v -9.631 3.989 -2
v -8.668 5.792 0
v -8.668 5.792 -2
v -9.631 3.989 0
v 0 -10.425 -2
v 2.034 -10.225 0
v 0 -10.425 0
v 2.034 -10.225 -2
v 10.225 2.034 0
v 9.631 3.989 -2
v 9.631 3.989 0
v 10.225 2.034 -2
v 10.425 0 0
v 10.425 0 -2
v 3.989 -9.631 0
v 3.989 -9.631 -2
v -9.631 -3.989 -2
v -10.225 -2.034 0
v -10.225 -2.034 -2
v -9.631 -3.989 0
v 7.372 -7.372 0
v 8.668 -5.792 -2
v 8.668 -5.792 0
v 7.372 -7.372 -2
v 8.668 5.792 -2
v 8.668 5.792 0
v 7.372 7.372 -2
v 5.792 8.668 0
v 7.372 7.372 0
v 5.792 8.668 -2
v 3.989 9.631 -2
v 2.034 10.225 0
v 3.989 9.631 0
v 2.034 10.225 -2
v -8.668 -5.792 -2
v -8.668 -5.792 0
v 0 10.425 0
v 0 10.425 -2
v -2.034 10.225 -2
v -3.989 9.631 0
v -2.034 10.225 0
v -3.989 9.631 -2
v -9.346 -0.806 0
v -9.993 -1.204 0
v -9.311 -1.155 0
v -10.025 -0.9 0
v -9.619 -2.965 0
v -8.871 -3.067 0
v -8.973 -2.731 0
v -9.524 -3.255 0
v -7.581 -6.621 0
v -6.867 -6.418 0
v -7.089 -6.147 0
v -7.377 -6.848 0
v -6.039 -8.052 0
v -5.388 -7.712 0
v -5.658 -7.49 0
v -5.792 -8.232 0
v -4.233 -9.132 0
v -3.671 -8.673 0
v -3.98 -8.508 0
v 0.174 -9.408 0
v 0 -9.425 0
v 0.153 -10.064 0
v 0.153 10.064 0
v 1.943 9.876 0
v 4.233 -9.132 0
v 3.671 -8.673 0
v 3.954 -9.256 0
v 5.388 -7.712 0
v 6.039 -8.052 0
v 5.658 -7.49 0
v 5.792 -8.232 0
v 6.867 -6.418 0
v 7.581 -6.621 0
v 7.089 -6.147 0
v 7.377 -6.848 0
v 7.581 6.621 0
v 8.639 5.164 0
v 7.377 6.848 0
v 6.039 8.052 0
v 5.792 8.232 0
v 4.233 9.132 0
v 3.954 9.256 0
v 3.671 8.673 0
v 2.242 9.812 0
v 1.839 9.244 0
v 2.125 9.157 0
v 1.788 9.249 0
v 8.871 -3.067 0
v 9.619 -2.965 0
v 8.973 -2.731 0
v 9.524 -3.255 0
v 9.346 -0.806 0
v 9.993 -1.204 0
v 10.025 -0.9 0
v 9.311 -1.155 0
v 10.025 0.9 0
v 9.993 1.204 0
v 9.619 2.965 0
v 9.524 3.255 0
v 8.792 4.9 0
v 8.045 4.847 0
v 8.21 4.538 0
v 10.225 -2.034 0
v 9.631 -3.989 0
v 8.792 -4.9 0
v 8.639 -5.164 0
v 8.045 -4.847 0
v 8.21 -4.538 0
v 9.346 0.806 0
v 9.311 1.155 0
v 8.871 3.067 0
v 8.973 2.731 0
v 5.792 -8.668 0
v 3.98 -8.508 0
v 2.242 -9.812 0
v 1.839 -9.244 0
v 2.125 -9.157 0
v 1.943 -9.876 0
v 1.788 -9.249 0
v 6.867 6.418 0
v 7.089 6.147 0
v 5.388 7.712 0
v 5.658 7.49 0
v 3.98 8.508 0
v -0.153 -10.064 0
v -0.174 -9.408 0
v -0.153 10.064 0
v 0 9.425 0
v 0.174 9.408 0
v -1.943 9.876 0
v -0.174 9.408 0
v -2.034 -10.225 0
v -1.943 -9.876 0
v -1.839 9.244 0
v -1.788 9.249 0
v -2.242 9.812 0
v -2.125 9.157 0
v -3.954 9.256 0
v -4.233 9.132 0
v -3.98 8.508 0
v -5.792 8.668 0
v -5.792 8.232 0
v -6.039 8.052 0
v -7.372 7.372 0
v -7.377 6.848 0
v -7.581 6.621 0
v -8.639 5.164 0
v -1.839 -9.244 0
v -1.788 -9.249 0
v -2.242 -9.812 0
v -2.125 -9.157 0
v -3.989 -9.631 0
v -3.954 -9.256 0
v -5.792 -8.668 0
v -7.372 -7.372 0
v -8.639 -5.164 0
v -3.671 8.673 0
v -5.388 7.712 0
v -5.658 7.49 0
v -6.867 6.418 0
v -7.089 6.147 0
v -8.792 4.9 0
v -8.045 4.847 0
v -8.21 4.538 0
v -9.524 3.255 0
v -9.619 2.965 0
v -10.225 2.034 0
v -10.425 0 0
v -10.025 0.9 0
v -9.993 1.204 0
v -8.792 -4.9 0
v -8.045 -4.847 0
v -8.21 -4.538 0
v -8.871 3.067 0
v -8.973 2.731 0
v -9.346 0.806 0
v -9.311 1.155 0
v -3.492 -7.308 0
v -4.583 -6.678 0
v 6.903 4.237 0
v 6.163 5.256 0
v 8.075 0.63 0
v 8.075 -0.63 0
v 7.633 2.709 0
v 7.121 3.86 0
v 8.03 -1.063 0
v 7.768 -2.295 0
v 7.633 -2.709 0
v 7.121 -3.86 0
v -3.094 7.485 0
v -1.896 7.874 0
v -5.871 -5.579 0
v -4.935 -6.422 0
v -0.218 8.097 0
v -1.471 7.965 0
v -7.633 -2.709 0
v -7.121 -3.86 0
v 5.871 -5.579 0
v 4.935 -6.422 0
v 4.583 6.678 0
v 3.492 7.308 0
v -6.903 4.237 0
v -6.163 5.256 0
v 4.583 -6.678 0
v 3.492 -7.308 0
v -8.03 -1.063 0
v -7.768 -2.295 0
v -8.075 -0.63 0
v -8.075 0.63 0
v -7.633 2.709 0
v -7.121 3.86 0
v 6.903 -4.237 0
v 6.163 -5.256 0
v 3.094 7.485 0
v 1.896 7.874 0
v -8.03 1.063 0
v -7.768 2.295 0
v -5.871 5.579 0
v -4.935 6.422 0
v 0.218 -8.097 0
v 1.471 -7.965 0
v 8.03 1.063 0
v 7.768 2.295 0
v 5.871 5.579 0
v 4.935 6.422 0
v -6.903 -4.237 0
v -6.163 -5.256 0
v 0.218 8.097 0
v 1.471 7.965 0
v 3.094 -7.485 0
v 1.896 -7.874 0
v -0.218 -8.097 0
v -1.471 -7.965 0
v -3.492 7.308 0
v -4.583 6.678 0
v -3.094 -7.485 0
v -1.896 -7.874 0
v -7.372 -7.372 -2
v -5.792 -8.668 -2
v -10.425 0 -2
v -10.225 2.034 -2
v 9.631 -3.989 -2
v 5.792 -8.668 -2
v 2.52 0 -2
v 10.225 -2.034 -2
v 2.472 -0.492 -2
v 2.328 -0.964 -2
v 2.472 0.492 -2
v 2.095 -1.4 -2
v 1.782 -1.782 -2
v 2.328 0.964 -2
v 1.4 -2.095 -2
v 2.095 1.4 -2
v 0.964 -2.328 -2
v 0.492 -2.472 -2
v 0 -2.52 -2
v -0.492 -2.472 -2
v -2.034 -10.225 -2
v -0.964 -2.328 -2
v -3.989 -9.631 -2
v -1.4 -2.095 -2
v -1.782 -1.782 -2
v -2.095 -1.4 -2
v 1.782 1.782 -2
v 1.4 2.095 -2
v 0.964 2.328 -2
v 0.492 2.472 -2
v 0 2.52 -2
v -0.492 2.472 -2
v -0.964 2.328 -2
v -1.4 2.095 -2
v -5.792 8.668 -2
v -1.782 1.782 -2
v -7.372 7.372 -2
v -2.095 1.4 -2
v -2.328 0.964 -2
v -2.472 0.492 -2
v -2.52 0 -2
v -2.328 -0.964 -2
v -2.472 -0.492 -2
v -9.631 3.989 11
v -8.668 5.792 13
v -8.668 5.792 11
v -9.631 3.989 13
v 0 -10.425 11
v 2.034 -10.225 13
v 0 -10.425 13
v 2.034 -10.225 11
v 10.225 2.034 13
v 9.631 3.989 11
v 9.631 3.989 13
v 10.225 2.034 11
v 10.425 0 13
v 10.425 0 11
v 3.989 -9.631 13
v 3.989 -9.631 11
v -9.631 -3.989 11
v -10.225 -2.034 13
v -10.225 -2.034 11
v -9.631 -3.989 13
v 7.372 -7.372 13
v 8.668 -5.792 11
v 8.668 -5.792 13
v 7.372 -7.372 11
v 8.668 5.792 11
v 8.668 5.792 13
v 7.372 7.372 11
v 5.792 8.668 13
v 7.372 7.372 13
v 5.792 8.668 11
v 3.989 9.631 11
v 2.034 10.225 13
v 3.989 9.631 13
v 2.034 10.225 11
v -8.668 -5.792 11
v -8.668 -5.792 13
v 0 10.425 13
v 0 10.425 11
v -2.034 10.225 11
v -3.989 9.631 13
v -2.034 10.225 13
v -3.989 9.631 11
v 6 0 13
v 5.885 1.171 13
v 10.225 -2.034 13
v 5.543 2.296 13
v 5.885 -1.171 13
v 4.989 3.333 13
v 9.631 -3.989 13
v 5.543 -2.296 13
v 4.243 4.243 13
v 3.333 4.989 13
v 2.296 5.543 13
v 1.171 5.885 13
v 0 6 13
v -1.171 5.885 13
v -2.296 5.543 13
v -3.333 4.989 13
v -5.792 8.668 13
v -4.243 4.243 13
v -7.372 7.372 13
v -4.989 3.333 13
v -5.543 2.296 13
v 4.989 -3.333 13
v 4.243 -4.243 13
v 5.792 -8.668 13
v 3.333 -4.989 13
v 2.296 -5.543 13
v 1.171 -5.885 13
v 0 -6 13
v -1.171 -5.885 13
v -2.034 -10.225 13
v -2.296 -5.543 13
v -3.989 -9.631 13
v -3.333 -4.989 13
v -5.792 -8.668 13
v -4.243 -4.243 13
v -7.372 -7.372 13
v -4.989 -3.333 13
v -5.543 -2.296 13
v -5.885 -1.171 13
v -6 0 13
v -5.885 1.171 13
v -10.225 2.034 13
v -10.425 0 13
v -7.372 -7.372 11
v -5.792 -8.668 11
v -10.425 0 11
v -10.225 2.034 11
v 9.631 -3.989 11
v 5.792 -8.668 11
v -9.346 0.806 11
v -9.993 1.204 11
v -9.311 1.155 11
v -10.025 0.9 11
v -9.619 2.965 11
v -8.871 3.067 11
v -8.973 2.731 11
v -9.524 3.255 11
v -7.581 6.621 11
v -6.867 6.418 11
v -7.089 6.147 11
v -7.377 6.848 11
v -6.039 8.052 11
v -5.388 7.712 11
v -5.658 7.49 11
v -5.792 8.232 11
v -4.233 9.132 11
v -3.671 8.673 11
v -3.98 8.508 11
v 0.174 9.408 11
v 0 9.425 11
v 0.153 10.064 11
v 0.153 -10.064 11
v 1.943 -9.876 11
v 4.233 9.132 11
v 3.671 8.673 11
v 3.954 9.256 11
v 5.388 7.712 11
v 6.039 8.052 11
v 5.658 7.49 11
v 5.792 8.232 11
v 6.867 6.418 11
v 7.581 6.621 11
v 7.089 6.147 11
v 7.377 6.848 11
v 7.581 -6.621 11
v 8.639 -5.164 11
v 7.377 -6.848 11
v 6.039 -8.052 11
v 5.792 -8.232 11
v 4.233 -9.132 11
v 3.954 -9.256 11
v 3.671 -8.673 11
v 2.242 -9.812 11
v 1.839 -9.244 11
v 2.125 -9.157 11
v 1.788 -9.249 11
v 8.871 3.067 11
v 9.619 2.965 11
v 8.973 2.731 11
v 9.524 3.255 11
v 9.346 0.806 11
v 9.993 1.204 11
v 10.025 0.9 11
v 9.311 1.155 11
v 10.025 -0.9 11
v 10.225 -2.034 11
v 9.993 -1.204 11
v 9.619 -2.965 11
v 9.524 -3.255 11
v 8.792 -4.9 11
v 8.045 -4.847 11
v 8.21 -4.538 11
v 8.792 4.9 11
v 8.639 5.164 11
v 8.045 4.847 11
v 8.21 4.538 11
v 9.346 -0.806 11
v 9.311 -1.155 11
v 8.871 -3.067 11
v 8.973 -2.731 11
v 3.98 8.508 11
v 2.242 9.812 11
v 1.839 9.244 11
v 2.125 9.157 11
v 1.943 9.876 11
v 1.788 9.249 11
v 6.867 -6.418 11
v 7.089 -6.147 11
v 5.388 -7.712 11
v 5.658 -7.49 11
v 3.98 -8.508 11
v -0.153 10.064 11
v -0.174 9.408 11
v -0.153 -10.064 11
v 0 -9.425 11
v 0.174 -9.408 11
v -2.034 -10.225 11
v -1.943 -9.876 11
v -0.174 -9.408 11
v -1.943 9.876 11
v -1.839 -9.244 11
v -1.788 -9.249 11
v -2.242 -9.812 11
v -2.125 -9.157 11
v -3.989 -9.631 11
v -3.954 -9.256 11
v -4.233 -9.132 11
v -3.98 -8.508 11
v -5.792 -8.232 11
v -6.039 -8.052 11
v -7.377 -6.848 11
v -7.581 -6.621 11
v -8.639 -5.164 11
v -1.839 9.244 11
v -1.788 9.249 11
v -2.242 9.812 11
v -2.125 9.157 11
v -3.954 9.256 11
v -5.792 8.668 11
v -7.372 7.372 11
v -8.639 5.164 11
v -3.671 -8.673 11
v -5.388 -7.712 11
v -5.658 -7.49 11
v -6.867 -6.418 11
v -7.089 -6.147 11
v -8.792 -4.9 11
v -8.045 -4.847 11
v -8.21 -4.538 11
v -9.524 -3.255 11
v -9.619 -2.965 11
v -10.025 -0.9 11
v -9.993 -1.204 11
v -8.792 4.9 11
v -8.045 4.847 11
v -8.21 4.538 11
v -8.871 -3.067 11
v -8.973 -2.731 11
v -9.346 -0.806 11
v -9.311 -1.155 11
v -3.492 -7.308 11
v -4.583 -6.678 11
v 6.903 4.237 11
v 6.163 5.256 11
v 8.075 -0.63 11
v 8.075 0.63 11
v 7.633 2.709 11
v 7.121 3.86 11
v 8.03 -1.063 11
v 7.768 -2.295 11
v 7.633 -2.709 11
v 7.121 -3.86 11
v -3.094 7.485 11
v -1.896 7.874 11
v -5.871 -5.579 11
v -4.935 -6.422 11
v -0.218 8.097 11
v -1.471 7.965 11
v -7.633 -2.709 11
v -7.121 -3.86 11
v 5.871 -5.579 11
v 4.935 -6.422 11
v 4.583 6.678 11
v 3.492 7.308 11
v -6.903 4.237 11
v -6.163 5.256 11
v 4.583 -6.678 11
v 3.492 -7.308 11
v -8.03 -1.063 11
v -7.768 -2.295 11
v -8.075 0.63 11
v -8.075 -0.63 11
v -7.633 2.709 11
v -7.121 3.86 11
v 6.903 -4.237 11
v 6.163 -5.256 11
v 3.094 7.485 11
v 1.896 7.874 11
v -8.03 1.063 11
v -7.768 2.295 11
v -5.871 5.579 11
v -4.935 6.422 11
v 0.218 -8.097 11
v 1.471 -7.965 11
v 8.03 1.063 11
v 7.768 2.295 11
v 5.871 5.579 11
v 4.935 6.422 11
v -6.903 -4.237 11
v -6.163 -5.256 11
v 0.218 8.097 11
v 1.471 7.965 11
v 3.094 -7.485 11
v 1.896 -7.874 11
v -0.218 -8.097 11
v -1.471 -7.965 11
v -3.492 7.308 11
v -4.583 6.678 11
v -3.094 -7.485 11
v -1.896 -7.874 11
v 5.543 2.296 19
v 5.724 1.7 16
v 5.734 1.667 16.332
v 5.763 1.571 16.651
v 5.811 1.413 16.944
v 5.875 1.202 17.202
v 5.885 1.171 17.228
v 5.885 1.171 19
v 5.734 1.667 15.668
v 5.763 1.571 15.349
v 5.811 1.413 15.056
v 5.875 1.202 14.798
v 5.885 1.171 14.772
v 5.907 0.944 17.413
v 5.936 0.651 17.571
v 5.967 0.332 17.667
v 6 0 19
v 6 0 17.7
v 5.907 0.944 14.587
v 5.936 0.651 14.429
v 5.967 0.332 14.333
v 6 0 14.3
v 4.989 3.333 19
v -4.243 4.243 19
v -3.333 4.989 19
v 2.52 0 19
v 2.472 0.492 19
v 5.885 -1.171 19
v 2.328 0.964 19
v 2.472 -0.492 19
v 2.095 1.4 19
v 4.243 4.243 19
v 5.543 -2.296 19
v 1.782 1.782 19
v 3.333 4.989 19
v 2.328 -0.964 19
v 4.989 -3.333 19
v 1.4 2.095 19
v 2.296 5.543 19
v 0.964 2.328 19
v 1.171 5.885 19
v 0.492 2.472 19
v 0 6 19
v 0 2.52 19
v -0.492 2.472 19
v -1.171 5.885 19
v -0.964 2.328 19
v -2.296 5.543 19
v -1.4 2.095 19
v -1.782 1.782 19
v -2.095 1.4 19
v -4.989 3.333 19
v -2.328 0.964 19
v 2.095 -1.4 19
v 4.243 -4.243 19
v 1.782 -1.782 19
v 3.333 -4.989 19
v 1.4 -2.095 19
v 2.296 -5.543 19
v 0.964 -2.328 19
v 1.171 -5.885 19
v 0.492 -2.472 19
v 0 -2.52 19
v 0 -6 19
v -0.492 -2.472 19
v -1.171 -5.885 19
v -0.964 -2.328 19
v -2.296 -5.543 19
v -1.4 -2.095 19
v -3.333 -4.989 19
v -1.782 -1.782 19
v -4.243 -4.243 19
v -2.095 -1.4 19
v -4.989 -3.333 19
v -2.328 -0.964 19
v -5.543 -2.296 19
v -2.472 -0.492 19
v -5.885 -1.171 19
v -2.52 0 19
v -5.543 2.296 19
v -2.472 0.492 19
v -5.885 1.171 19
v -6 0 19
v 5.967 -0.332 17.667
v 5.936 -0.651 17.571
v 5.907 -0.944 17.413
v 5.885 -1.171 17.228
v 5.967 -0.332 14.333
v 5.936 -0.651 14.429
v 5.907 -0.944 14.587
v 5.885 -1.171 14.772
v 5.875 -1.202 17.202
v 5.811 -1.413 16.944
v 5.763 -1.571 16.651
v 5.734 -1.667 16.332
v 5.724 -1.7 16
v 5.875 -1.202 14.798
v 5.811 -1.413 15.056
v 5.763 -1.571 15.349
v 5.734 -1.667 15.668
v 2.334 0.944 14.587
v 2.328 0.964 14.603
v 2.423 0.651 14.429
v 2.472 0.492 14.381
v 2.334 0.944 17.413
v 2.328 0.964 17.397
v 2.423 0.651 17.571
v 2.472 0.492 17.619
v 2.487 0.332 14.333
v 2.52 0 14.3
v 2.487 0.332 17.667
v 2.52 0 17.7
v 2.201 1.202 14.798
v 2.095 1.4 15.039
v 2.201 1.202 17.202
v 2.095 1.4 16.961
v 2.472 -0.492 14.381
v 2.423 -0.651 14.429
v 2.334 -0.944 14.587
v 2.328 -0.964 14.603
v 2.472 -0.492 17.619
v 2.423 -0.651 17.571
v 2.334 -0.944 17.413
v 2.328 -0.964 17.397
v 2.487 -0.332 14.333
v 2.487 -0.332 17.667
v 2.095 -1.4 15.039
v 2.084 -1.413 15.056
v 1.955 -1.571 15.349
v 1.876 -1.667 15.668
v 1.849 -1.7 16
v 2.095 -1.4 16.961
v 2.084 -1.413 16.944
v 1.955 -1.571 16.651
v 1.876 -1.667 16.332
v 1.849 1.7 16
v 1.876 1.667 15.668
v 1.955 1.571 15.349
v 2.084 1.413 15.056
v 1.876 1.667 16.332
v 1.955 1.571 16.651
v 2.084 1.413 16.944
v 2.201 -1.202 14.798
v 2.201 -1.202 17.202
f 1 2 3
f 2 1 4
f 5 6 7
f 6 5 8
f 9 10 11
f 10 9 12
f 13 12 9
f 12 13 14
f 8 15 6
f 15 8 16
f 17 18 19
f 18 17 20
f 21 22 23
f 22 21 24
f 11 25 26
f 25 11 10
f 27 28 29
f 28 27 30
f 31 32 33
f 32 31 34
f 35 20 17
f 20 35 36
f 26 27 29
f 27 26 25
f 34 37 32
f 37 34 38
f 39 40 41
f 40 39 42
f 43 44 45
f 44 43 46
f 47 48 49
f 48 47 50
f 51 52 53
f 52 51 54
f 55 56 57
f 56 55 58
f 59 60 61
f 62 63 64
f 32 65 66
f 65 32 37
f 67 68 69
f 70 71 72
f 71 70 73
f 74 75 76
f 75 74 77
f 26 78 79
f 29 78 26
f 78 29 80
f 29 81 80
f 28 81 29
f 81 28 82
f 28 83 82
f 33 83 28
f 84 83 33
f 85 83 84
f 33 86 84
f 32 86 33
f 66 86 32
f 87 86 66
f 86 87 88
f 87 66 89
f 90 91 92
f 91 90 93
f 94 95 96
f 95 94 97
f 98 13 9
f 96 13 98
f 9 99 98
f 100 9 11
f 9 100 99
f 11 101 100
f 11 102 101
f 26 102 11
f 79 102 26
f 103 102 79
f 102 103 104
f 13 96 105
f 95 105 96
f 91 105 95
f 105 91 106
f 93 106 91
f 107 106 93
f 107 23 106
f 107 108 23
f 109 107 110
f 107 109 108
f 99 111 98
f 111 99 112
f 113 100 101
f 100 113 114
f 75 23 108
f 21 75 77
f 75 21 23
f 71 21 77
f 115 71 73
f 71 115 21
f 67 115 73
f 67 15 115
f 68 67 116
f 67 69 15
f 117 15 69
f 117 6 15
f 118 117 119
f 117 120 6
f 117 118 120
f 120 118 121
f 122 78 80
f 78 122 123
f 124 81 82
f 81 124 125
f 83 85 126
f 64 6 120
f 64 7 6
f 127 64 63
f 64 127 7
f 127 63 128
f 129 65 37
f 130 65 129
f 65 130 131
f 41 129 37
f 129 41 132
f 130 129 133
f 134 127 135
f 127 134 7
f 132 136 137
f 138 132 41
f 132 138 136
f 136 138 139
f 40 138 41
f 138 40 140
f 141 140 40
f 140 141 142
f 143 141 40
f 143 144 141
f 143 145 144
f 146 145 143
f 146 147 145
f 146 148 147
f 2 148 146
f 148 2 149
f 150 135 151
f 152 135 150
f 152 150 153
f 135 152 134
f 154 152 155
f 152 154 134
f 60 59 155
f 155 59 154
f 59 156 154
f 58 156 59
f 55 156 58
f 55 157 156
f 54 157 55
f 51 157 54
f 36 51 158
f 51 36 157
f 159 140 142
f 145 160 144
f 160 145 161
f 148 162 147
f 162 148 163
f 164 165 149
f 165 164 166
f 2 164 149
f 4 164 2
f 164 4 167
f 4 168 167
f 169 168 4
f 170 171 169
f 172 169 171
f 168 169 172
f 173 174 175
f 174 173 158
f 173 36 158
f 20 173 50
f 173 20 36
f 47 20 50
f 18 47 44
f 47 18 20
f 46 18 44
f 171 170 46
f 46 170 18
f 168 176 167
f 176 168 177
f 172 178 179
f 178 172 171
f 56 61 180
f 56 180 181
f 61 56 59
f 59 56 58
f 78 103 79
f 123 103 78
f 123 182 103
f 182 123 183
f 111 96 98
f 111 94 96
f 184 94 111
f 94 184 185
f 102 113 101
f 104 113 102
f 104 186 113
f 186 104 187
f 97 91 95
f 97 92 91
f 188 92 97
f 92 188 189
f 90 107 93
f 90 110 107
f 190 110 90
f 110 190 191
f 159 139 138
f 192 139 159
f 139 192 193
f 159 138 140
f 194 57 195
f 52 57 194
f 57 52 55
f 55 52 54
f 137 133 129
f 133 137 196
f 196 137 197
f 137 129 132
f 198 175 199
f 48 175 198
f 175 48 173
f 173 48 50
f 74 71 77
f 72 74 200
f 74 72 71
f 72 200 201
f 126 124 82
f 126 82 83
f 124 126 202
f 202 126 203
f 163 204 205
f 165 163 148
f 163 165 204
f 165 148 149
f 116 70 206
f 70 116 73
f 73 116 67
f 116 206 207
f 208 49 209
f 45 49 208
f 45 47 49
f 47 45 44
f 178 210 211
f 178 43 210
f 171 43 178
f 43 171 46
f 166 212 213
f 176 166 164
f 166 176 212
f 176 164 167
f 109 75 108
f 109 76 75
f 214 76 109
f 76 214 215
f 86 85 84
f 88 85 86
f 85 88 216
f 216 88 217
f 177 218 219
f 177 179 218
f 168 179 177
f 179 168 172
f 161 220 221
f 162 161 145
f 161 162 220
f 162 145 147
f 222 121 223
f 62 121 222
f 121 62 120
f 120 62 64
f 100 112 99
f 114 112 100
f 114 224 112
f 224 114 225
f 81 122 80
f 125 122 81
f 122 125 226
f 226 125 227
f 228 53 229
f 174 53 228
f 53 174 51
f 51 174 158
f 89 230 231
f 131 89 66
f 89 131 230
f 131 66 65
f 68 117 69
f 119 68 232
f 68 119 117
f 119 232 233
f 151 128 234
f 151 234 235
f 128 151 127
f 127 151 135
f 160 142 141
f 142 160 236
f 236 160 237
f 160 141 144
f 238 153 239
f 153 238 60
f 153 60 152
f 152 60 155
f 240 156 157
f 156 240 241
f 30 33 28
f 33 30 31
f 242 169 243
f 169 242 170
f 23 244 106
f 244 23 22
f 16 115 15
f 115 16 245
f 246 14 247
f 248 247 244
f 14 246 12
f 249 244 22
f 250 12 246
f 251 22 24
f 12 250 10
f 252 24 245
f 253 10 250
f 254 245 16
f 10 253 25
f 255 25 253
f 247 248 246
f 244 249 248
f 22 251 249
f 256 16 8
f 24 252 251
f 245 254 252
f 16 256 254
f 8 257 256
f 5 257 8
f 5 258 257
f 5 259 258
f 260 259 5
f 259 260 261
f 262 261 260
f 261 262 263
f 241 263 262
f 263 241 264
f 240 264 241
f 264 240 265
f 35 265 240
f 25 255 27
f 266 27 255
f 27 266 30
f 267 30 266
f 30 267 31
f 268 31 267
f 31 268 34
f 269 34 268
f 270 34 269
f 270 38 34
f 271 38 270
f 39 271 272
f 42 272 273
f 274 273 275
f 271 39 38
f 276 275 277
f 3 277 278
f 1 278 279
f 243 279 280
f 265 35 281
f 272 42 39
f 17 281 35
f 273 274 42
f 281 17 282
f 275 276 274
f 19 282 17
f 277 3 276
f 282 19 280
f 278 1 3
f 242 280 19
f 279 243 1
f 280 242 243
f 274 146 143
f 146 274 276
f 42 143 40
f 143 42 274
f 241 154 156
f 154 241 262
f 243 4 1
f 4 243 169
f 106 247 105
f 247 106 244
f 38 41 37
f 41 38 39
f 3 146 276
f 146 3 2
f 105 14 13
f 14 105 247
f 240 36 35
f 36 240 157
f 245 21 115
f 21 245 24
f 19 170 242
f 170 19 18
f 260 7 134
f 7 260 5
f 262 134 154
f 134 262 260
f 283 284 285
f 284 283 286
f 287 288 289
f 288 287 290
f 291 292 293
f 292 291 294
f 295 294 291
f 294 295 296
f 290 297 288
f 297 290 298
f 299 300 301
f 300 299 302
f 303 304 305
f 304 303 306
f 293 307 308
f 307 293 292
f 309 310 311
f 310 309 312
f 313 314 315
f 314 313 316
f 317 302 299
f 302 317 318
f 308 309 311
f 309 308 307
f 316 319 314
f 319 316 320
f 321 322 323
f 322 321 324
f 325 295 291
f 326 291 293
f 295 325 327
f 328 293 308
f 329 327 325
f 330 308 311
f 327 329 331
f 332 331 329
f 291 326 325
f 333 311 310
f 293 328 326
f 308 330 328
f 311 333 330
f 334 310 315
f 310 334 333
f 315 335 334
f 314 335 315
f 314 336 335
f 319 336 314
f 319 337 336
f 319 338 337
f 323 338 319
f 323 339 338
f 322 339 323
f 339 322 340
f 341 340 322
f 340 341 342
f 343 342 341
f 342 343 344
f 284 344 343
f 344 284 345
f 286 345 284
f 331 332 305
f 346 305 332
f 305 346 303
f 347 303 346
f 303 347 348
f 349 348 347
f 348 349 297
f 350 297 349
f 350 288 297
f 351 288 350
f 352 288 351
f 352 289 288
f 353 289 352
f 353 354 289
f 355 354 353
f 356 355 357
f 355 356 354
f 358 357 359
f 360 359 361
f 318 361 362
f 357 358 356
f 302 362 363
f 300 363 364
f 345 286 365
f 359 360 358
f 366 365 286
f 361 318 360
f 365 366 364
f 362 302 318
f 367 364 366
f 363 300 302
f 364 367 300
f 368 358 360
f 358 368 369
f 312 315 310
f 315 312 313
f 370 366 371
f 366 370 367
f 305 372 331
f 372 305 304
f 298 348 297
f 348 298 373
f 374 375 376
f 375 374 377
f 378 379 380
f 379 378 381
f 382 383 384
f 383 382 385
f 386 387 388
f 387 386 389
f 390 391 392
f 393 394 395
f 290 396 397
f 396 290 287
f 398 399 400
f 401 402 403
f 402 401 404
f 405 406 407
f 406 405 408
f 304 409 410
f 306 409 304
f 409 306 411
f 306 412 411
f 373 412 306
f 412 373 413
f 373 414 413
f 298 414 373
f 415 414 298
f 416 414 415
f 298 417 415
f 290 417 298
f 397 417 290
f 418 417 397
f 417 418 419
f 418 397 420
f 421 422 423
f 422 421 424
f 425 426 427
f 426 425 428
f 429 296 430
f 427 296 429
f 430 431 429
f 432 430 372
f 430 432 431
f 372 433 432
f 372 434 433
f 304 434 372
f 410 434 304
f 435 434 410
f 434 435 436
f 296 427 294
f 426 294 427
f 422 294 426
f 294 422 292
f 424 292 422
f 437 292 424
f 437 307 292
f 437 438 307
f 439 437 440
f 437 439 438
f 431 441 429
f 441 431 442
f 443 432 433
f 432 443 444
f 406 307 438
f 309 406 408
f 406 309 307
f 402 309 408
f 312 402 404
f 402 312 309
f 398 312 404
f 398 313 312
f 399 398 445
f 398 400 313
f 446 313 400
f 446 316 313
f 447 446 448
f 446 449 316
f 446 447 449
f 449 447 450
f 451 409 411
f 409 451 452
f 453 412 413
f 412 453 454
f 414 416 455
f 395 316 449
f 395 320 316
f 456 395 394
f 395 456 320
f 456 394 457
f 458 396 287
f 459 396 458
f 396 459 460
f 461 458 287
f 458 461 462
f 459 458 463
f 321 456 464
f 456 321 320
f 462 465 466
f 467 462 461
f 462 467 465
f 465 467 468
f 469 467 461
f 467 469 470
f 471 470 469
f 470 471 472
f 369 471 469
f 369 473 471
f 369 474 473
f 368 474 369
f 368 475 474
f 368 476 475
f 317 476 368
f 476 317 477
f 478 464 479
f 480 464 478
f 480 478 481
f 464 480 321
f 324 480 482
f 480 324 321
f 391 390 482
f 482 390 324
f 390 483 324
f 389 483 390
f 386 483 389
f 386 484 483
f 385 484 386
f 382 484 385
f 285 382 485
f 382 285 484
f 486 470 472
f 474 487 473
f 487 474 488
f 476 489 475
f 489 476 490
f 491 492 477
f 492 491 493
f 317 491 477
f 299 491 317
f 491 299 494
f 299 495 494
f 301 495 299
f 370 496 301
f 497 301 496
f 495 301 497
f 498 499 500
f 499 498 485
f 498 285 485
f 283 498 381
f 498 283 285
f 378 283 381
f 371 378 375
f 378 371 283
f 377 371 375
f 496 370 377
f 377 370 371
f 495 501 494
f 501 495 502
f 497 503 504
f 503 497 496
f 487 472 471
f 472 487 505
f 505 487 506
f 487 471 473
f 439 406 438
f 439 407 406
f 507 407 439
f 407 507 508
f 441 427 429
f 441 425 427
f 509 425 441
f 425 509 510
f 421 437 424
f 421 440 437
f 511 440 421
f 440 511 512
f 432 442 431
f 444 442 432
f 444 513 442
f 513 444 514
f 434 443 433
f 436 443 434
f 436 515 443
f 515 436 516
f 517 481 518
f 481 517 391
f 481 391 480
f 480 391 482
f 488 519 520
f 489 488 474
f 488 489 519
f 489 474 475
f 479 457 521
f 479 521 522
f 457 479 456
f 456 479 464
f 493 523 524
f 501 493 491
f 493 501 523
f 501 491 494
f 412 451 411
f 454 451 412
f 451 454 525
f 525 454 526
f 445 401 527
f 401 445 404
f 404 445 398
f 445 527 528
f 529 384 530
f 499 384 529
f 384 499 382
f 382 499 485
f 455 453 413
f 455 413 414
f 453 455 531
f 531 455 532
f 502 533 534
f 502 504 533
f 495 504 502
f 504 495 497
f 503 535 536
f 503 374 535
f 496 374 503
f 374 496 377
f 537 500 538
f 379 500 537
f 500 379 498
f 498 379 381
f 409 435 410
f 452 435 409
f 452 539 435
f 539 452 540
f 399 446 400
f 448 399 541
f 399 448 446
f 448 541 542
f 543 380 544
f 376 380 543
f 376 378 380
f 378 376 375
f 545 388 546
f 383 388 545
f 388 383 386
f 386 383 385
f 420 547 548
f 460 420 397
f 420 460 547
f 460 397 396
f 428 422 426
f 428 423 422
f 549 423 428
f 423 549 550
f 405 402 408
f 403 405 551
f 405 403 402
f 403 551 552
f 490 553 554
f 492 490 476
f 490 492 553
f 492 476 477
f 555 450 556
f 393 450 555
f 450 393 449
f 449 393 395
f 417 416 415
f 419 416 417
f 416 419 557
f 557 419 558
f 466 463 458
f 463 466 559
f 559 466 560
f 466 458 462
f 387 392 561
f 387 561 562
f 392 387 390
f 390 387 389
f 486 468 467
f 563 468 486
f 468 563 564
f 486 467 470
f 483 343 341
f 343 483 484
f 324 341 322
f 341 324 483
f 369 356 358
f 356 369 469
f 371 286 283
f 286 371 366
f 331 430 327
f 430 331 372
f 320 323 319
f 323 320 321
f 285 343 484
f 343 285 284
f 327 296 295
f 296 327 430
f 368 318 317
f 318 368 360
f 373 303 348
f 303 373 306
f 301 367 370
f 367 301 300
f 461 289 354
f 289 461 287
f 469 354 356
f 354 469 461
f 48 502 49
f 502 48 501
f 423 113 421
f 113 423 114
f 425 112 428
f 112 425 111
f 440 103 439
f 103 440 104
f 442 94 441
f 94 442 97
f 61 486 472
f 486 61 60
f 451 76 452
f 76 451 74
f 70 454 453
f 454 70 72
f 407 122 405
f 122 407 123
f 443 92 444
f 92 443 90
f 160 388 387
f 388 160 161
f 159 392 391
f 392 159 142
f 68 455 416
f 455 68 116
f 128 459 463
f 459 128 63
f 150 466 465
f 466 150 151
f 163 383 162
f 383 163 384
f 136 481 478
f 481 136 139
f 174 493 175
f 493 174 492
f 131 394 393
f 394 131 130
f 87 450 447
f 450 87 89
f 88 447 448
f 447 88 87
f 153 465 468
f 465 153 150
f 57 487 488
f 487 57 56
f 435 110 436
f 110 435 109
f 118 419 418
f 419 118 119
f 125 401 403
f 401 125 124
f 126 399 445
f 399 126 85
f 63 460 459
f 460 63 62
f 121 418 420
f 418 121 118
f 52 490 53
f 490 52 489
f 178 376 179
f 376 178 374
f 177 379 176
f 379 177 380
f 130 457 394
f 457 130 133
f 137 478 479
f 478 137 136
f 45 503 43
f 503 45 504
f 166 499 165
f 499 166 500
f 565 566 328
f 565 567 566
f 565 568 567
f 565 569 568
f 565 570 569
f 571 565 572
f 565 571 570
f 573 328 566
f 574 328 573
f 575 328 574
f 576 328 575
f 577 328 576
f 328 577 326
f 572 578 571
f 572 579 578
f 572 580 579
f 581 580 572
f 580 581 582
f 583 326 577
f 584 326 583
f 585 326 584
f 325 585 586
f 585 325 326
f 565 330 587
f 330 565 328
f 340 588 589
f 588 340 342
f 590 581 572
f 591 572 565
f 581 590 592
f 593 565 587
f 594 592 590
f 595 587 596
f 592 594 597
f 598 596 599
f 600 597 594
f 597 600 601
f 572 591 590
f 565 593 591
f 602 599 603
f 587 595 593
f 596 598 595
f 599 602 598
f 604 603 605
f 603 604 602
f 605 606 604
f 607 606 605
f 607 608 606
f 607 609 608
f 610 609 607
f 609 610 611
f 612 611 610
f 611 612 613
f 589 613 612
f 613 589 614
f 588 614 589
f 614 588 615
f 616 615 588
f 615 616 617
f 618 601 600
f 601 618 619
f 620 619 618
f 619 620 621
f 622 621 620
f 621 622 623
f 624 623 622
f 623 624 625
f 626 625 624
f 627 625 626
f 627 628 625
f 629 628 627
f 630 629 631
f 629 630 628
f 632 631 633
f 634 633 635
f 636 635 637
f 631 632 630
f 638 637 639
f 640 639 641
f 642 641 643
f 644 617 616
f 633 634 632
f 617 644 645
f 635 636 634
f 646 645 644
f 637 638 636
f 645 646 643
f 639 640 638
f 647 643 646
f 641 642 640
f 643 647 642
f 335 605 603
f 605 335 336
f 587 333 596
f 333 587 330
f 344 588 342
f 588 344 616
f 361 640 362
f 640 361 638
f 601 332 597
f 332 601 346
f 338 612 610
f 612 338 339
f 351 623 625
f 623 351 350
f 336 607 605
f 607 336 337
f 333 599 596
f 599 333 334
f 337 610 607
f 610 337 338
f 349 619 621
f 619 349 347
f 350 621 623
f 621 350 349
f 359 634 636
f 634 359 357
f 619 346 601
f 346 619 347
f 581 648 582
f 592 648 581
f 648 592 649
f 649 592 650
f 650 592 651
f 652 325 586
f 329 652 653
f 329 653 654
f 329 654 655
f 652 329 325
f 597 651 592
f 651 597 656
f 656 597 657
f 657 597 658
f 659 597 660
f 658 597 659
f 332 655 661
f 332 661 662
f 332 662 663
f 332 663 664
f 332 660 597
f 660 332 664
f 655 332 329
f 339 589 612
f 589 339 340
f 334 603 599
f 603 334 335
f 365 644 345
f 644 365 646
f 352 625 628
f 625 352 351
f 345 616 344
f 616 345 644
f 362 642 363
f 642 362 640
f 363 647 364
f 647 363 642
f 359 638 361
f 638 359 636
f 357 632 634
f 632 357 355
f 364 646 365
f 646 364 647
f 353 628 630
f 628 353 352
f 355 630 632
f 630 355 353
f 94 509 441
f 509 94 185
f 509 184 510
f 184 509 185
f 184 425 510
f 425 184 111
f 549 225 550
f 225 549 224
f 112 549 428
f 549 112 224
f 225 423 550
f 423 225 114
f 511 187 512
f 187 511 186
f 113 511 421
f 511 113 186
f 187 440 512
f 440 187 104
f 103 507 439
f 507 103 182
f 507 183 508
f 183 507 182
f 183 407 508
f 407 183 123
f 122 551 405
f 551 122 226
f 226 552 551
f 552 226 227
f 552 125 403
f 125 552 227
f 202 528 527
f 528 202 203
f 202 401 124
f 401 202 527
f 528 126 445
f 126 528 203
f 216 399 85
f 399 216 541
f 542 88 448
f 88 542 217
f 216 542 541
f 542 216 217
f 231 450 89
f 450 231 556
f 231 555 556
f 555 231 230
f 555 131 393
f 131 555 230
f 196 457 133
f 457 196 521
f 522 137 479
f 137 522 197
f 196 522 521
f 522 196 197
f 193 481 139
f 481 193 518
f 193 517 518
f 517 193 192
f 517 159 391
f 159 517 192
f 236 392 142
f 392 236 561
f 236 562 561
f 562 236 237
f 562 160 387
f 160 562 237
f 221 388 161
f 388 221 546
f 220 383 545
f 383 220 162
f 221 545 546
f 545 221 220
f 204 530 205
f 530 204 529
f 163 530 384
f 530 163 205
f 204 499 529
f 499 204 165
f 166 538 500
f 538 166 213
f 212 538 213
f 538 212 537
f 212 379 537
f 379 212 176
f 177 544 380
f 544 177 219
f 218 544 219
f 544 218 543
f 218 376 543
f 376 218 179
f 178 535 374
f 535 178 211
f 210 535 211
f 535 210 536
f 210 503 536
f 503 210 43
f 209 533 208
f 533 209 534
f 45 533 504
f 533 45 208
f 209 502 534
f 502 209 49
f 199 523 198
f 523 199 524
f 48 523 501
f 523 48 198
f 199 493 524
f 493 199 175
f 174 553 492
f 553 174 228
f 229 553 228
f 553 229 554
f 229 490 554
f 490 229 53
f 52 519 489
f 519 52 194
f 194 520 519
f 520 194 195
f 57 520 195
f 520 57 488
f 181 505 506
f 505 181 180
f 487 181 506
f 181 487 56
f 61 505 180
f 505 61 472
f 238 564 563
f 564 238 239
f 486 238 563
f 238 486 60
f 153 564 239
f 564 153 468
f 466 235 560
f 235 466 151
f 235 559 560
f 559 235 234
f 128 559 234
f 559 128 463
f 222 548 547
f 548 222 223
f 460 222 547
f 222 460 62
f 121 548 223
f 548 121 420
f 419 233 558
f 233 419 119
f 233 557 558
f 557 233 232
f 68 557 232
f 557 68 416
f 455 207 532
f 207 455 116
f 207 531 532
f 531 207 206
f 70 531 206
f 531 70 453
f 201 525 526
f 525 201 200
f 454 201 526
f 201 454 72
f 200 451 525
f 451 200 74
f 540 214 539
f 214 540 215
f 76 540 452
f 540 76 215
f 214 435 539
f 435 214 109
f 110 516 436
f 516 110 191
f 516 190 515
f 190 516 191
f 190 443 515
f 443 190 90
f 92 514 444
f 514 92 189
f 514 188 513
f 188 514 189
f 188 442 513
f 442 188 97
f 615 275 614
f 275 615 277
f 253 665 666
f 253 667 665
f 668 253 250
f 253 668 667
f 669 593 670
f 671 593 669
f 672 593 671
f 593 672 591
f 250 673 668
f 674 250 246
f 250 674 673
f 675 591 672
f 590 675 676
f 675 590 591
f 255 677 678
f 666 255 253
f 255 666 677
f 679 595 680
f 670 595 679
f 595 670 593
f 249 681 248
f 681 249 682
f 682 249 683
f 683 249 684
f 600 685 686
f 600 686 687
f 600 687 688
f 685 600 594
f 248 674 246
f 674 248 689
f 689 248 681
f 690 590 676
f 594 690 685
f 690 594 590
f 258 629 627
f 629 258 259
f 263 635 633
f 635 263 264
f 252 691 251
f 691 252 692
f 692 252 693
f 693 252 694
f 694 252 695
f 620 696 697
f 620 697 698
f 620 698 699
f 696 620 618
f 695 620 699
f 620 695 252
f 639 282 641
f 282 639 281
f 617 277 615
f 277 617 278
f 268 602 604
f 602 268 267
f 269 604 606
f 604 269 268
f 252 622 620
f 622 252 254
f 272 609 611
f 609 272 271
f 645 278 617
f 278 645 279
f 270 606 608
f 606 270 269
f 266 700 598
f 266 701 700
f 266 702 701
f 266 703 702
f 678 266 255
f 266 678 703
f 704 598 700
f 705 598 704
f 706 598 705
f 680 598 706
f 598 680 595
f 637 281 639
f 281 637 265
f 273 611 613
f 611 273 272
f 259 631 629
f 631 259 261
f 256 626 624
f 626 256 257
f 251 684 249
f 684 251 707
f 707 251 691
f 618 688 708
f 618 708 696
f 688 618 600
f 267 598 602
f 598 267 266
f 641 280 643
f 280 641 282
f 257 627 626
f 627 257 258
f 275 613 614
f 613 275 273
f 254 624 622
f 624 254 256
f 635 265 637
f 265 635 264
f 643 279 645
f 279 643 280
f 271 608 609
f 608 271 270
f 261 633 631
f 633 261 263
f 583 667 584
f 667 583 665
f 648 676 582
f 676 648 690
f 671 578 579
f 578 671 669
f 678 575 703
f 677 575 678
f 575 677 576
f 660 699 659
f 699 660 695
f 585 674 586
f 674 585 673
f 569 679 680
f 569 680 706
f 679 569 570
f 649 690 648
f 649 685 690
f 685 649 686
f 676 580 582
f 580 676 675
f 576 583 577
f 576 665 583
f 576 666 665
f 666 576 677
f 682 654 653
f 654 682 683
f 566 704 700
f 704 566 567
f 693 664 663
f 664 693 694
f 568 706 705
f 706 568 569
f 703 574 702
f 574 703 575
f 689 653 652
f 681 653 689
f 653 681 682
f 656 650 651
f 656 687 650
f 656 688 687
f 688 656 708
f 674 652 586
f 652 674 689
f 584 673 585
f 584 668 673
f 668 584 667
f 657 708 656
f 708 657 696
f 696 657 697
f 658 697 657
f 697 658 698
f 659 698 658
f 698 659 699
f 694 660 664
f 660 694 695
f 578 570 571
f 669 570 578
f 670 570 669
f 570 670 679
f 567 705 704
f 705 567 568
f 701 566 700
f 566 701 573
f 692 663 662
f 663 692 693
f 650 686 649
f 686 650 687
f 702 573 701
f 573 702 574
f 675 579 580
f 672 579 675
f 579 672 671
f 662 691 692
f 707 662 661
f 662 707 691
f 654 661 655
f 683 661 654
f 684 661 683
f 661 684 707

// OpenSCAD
$fn = 32;

// ----------------------------------------------------------------------
// Timing pulley: GT2 30T, pitch 2 mm, 20.85 mm x 21 mm
// ----------------------------------------------------------------------

// --- parameters (mm) ---
pitch = 2;                // belt pitch
teeth = 30;               // number of grooves
belt_w = 11;              // belt width between the flanges
tip_d = 18.85;            // tip circle diameter
root_d = 17.35;           // groove bottom diameter
groove_h = 0.75;          // groove depth
tooth_w = 1.5;            // groove width at the tip circle
flange_d = 20.85;         // flange diameter
flange_t = 2;             // flange thickness
spigot_d = 15.75;         // flange spigot, sunk into the rim
spigot_h = 1.2;           // spigot depth into the rim
bore_d = 5.04;            // shaft bore
hub_d = 12;               // hub diameter
hub_h = 6;                // hub above the flange
bottom_z = -2;            // lowest point of the pulley
top_z = 19;               // highest point of the pulley
set_d = 3.4;              // set screw tap hole

module rim() {
  cylinder(h = belt_w, d = tip_d);
}

module groove_cutter() {
  /* belt tooth groove: deeper than wide, cut through the belt width */
  translate([root_d / 2, 0, 0])
    linear_extrude(height = belt_w)
      polygon(points = [[-0.6, -tooth_w * 0.42], [groove_h + 0.6, -tooth_w * 0.6],
                        [groove_h + 0.6, tooth_w * 0.6], [-0.6, tooth_w * 0.42]]);
}

module flanges() {
  translate([0, 0, -flange_t]) cylinder(h = flange_t, d = flange_d);
  translate([0, 0, belt_w]) cylinder(h = flange_t, d = flange_d);
  translate([0, 0, -spigot_h]) cylinder(h = spigot_h + 0.6, d = spigot_d);
  translate([0, 0, belt_w - 0.6]) cylinder(h = spigot_h + 0.6, d = spigot_d);
}

module hub() {
  translate([0, 0, bottom_z]) cylinder(h = top_z - bottom_z, d = hub_d);
}

difference() {
  union() {
    rim();
    hub();
    flanges();
  }
  for (i = [0 : teeth - 1]) rotate([0, 0, i * 360 / teeth]) groove_cutter();
  translate([0, 0, bottom_z - 1]) cylinder(h = top_z - bottom_z + 2, d = bore_d);
  translate([-1, 0, top_z - hub_h * 0.5]) rotate([0, 90, 0]) cylinder(h = hub_d / 2 + 3, d = set_d);
}
